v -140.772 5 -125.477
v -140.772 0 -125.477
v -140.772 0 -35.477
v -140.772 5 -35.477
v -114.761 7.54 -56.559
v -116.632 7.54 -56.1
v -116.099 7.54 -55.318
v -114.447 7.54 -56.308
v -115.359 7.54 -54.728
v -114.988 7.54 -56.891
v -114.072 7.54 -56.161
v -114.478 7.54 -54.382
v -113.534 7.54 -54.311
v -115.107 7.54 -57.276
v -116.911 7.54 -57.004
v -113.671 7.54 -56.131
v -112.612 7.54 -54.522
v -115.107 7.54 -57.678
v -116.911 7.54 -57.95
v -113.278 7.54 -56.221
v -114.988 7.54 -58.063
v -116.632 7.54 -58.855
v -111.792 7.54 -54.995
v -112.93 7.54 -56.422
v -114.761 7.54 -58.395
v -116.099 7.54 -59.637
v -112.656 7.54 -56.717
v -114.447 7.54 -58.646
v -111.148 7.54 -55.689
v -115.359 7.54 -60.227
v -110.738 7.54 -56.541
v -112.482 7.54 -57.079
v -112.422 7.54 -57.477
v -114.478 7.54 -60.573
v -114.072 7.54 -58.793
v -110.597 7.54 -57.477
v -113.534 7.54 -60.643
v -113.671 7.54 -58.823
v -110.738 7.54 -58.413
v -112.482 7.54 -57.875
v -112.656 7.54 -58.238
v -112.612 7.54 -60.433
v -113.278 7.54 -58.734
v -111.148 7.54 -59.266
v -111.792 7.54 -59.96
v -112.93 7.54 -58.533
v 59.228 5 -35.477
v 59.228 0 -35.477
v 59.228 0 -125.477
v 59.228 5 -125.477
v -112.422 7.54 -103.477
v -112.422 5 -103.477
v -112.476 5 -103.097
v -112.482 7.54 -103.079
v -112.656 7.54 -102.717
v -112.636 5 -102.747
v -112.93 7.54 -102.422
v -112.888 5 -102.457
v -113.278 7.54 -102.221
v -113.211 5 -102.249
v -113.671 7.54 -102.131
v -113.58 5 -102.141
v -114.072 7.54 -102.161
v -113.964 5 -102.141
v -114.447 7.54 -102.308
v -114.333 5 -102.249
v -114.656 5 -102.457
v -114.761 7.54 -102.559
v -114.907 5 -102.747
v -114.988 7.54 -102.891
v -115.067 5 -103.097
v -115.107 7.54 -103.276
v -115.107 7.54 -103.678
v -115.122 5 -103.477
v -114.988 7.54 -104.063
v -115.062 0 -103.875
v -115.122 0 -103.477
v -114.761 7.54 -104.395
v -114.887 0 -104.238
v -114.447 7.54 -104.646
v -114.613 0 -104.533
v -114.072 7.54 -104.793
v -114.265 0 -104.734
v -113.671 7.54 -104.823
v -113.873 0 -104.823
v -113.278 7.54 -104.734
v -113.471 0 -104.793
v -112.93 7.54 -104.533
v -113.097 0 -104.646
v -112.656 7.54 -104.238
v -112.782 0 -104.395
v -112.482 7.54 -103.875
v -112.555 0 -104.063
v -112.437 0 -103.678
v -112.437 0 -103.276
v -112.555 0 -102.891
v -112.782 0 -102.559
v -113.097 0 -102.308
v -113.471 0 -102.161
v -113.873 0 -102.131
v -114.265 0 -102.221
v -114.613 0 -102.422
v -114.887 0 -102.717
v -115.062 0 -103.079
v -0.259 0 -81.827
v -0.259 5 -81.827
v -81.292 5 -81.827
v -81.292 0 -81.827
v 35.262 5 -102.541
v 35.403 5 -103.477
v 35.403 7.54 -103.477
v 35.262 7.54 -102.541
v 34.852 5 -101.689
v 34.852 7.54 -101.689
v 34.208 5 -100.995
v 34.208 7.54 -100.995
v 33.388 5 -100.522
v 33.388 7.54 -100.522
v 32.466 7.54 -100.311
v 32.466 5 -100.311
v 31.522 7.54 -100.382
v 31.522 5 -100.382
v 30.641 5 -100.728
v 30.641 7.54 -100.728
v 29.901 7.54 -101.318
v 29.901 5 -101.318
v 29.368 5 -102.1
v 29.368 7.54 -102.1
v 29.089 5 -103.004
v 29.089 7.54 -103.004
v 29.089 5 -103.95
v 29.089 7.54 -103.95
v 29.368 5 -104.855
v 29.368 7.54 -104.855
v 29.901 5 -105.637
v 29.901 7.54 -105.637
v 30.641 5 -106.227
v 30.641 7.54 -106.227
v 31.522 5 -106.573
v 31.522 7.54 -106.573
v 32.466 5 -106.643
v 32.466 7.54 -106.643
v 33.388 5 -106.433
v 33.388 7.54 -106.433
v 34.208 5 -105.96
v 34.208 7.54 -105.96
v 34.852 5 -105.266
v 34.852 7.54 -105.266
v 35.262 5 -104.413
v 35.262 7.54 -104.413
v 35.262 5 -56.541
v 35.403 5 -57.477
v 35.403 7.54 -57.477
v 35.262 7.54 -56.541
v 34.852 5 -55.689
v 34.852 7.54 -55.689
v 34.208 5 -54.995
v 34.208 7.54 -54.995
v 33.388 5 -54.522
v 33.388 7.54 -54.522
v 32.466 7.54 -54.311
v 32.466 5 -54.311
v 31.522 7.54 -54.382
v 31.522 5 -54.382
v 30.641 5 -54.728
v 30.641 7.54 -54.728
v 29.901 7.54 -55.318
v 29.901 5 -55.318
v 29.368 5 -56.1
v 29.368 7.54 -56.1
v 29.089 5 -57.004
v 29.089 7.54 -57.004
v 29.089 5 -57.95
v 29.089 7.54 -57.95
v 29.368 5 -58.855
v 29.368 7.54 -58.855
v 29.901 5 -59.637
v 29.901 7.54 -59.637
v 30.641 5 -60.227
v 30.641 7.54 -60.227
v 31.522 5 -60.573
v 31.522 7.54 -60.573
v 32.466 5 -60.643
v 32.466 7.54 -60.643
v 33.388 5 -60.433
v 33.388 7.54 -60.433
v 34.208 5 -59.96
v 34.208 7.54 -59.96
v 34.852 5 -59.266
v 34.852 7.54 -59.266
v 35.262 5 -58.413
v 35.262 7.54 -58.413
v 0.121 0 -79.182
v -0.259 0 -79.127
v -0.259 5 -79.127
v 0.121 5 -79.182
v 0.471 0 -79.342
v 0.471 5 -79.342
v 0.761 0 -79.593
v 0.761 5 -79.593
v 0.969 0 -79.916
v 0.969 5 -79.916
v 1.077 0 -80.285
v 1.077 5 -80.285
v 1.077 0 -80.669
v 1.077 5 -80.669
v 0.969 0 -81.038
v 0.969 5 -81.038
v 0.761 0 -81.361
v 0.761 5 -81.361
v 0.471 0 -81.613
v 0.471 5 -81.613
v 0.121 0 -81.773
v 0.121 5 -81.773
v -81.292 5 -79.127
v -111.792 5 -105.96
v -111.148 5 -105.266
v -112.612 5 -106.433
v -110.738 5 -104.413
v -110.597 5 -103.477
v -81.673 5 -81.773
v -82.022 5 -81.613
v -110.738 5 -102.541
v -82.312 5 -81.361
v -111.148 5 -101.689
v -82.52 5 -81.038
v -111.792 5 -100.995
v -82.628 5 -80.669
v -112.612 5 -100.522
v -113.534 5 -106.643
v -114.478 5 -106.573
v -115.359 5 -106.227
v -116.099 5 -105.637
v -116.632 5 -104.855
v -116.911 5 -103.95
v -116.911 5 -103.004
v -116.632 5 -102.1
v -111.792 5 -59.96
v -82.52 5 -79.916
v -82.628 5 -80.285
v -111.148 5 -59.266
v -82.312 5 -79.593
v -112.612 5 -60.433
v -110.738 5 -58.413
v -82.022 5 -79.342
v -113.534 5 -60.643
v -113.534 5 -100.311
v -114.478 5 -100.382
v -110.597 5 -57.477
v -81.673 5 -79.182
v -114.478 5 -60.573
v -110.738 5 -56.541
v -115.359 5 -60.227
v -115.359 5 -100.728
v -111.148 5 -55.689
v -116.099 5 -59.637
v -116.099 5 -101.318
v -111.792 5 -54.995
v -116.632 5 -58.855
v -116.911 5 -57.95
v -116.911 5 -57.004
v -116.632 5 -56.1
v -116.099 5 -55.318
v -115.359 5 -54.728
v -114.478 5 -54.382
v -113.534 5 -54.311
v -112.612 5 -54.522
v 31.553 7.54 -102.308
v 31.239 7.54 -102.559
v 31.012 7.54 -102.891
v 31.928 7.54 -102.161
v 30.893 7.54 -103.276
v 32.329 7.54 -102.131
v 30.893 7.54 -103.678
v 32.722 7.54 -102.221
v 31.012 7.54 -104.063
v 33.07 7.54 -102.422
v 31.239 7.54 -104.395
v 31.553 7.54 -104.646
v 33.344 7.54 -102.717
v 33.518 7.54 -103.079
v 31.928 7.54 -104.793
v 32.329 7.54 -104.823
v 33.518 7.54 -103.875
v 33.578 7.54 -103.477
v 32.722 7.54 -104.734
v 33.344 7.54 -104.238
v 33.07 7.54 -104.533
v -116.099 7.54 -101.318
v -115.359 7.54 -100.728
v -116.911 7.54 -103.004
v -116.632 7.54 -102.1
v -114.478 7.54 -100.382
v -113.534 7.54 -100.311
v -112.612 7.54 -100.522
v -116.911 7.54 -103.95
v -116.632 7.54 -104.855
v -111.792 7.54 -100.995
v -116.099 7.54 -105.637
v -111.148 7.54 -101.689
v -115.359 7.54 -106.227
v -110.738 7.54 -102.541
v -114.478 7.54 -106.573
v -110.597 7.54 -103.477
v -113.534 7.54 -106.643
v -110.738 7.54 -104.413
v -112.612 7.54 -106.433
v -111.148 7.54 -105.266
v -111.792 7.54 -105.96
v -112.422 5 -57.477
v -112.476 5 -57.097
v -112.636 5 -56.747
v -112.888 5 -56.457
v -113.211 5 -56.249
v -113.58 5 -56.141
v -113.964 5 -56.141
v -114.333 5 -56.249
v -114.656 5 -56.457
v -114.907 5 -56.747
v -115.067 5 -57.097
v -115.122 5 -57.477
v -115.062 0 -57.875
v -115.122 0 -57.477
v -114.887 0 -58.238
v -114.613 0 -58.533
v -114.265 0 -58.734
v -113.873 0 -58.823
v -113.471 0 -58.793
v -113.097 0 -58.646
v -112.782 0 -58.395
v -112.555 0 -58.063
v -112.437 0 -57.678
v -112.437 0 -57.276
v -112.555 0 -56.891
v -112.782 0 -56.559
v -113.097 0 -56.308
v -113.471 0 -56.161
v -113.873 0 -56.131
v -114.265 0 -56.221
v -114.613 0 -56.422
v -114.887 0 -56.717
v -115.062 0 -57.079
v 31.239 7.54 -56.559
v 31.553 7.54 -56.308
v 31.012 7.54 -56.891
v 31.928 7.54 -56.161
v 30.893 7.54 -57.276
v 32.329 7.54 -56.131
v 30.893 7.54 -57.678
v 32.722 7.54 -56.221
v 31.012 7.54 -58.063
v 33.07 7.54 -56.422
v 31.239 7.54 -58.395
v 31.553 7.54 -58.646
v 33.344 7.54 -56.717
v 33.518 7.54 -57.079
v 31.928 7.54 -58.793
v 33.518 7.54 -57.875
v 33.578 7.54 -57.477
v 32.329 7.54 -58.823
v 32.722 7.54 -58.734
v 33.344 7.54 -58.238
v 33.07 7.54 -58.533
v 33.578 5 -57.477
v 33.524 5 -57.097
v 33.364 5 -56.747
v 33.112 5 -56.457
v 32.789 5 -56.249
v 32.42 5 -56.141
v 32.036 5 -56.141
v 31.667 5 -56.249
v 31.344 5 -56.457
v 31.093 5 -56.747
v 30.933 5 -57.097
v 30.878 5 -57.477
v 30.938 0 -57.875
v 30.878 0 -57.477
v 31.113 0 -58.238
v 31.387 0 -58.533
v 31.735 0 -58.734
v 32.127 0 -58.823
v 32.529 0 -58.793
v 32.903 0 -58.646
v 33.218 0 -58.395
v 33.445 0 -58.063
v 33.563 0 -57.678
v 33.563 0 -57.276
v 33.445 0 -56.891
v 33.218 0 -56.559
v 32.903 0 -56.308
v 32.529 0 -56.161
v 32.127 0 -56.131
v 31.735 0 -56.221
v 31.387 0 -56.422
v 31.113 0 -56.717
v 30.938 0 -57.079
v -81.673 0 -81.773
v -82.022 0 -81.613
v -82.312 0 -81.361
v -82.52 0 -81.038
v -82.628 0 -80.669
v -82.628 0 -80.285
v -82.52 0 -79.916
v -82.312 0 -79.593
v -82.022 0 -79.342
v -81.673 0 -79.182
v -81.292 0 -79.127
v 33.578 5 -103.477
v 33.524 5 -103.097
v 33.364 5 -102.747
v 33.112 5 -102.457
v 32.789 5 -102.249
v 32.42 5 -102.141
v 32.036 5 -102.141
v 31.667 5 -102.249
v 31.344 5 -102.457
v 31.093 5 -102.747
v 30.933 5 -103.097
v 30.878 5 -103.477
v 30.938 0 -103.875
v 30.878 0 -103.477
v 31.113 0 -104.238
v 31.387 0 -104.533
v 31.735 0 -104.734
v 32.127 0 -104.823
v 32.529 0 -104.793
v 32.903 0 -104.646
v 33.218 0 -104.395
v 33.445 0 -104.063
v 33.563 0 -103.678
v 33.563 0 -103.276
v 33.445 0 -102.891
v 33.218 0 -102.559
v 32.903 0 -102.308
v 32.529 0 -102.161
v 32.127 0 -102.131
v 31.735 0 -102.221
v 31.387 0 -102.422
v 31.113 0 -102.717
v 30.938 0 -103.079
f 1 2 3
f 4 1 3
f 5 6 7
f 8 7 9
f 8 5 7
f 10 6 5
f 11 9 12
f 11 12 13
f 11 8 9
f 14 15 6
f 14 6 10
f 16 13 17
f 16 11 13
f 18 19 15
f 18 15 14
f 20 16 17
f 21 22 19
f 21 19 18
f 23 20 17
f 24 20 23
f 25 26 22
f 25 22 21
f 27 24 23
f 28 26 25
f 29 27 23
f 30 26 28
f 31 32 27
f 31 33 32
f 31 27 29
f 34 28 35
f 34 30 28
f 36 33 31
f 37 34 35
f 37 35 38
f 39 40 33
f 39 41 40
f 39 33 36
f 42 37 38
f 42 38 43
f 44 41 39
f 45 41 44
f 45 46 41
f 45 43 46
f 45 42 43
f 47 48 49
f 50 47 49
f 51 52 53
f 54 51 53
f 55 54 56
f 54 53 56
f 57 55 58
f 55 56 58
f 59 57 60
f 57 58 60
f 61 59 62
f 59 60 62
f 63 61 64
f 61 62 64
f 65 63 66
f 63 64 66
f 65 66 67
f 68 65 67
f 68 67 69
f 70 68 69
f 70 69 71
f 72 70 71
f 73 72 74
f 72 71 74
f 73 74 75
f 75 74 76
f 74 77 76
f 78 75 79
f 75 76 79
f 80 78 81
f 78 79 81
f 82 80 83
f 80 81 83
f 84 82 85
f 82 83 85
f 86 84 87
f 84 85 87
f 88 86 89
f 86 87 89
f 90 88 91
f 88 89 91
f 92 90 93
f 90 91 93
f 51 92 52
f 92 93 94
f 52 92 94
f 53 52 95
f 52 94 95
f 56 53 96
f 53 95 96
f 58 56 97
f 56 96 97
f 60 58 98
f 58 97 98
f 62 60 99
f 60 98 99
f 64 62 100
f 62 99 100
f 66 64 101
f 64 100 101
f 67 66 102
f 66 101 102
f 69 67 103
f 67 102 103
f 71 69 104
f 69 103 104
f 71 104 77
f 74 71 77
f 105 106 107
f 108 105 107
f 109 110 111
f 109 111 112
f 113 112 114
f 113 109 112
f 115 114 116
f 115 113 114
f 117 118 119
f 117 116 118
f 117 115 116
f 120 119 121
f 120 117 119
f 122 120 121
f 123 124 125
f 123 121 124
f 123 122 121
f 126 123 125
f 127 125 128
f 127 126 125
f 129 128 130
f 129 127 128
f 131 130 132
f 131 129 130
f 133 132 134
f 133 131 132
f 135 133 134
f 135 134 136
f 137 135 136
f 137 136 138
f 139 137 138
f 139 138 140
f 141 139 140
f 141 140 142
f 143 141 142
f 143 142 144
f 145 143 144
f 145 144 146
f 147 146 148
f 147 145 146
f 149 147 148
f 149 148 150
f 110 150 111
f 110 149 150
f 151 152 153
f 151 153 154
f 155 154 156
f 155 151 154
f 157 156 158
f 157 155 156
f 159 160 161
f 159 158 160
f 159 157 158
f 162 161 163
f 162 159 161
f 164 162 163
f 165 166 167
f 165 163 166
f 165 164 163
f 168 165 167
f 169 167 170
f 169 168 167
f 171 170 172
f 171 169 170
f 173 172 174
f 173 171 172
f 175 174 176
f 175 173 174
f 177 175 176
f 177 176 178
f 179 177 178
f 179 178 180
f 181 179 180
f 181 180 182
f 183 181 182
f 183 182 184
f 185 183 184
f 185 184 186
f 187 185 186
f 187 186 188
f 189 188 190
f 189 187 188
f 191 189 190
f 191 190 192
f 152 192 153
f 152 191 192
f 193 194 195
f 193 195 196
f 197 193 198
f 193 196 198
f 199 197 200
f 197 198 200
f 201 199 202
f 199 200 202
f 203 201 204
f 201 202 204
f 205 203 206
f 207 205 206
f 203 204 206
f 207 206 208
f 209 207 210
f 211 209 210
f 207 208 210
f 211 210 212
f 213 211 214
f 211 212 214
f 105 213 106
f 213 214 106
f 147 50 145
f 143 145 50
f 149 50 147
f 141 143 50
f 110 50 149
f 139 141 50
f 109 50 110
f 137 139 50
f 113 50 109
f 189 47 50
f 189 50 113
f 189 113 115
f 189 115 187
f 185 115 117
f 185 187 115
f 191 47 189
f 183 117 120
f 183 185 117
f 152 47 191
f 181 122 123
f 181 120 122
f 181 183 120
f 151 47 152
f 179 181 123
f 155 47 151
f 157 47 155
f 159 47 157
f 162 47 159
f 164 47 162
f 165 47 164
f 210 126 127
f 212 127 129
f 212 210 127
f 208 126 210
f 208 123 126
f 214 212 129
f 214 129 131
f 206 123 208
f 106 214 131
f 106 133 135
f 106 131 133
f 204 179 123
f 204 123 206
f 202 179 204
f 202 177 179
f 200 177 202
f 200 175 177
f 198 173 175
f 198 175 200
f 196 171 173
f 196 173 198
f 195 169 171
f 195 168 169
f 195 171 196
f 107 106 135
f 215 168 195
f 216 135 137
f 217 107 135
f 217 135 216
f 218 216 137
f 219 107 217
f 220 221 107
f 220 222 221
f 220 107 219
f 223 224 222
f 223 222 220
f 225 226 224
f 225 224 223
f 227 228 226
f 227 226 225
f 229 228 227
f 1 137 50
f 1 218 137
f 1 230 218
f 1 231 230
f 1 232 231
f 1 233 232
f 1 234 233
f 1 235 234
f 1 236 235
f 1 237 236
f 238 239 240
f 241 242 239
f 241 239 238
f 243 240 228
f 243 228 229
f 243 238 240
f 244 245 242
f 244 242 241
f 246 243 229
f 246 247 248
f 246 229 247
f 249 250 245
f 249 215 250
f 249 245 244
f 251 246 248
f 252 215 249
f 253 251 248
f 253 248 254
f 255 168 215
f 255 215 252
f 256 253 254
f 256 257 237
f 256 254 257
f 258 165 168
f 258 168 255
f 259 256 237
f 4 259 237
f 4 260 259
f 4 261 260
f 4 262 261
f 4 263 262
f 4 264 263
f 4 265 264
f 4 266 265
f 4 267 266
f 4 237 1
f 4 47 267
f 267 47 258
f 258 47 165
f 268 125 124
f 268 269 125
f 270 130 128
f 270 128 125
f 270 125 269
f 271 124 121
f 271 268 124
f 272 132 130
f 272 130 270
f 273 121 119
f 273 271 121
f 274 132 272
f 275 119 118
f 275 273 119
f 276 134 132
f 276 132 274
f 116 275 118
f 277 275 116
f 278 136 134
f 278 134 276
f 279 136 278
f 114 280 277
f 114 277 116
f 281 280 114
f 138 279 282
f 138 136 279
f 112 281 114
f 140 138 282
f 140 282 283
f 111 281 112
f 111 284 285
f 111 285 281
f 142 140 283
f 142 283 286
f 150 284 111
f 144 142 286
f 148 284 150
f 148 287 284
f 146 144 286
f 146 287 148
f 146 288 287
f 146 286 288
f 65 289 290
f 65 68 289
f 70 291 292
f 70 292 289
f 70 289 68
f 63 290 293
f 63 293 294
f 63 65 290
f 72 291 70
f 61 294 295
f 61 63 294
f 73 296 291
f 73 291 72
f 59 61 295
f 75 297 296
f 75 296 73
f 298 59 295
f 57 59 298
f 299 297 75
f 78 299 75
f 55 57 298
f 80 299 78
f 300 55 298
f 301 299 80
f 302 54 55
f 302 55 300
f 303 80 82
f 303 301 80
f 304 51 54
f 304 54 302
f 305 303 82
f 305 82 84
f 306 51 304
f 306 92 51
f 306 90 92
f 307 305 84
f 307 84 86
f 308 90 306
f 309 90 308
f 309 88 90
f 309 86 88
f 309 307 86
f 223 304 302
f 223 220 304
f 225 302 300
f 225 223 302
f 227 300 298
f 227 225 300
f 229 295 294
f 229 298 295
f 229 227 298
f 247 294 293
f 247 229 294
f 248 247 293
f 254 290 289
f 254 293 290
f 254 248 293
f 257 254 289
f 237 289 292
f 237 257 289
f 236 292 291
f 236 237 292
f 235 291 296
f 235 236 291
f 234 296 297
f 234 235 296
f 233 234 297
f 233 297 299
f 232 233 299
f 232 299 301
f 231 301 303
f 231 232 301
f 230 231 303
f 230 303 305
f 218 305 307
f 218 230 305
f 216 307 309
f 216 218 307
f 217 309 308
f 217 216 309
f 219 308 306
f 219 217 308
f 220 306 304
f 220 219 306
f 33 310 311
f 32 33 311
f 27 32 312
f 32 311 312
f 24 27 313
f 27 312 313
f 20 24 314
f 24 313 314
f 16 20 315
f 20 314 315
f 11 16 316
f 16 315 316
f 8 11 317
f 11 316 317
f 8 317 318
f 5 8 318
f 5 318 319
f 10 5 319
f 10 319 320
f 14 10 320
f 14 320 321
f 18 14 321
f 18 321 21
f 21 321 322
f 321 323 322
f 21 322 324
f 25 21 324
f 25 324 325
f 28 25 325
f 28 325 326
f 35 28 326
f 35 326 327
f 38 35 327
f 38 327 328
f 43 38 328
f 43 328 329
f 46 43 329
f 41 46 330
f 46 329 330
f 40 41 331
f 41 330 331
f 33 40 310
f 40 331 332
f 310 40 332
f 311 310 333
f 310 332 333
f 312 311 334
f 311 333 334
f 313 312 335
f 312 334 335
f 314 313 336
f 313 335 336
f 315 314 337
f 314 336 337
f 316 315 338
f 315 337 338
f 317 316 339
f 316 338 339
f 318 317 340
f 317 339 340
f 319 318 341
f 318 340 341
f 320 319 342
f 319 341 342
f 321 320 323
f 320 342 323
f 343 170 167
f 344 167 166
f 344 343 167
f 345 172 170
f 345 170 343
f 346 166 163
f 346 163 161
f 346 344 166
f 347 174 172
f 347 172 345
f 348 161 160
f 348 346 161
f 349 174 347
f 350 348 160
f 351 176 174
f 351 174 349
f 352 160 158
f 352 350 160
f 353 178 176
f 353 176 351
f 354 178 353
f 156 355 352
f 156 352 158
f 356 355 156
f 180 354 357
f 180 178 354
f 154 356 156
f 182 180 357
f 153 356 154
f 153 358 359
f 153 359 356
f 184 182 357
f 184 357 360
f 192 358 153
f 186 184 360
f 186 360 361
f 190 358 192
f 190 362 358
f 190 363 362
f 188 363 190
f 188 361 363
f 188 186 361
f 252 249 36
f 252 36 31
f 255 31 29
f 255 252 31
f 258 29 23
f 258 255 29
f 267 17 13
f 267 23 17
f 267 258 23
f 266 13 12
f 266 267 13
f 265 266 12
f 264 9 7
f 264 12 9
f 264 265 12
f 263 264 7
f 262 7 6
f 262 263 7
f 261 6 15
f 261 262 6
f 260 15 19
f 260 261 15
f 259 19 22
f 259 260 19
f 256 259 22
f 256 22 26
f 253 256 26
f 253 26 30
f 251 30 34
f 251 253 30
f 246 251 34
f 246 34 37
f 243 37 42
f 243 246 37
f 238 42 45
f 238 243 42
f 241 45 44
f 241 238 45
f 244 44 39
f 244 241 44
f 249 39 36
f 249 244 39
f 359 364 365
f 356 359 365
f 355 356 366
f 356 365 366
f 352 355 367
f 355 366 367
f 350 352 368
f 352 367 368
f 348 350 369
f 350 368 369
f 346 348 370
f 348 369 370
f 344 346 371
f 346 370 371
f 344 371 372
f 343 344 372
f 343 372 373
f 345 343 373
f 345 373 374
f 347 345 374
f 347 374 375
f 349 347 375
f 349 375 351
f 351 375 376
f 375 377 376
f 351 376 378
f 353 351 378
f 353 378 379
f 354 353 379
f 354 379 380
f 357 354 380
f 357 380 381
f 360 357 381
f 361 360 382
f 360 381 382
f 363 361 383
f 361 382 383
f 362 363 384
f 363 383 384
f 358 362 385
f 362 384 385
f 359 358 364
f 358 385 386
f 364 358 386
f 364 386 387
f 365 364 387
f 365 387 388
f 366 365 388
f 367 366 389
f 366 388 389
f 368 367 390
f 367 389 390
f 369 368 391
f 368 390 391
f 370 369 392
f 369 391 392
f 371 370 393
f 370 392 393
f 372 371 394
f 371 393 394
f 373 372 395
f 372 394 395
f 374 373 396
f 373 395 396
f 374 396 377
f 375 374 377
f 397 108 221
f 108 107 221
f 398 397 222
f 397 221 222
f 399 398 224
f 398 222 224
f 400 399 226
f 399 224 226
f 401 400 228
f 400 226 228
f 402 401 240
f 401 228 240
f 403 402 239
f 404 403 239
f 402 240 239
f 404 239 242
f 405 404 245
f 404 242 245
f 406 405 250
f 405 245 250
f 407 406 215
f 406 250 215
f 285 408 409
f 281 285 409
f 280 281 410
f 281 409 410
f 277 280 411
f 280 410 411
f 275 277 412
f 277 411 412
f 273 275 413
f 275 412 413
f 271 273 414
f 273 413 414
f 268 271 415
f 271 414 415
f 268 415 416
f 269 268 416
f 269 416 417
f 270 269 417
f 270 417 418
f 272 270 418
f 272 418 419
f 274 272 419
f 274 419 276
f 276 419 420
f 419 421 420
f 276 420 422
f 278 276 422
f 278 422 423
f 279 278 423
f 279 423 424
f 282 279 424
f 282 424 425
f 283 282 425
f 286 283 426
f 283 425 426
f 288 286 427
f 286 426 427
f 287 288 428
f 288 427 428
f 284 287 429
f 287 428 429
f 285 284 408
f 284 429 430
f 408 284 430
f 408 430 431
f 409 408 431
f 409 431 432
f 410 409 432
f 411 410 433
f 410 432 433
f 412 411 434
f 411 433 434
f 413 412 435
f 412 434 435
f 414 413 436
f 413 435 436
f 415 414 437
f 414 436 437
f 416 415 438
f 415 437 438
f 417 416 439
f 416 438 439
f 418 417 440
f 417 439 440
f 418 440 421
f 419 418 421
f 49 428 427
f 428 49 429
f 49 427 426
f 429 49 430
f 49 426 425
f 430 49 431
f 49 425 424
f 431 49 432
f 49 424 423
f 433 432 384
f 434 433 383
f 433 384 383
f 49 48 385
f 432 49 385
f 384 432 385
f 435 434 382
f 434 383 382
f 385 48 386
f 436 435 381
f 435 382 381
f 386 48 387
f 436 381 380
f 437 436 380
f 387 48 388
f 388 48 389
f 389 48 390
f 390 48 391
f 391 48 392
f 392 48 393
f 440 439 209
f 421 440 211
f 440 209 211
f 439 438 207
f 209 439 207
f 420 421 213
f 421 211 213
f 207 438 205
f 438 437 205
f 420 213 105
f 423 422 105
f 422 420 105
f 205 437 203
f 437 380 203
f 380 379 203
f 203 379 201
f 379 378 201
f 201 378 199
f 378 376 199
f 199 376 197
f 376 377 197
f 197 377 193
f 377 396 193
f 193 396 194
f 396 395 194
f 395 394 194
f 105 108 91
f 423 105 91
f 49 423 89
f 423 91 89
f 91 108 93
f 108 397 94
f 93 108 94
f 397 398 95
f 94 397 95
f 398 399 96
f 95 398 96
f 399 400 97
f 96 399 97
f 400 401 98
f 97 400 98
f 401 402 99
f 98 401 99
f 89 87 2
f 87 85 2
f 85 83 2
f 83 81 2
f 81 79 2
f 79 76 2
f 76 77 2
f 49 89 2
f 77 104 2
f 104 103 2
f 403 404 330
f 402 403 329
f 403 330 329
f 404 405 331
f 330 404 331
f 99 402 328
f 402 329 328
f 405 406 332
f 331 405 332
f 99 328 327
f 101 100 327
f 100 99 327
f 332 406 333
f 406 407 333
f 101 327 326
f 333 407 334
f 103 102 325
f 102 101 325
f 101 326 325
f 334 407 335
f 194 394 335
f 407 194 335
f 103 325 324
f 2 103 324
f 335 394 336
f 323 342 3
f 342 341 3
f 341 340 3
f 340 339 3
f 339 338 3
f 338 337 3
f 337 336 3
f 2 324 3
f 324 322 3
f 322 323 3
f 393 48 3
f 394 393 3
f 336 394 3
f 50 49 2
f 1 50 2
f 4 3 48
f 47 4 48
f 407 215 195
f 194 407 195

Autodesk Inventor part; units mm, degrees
ref_plane "YZ Plane" through (0, 0, 0) normal (1, 0, 0) x (0, 1, 0)
ref_plane "XZ Plane" through (0, 0, 0) normal (0, 1, 0) x (-1, 0, 0)
ref_plane "XY Plane" through (0, 0, 0) normal (0, 0, 1) x (1, 0, 0)
sketch "Sketch1" plane through (0, 0, 0) normal (0, 1, 0) x (-1, 0, 0)
  circle A0 centre (113.7717, -57.4772) radius 1.35
  circle A1 centre (113.7717, -103.4772) radius 1.35
  circle A2 centre (-32.2283, -57.4772) radius 1.35
  circle A3 centre (-32.2283, -103.4772) radius 1.35
  line L0 (140.7717, -35.4772) -> (-59.2283, -35.4772)
  line L1 (-59.2283, -35.4772) -> (-59.2283, -125.4772)
  line L2 (-59.2283, -125.4772) -> (140.7717, -125.4772)
  line L3 (140.7717, -125.4772) -> (140.7717, -35.4772)
  point P0 (0, 0)
  point P1 (140.7717, -80.4772)
  dimension "d2" = 2.7
  dimension "d3" = 2.7
  dimension "d4" = 2.7
  dimension "d5" = 2.7
  dimension "d6" = 200
  dimension "d7" = 90
extrude "Extrusion1" add sketch "Sketch1" along normal blind 5
sketch "Sketch2" plane through (0, 5, 0) normal (0, 1, 0) x (1, 0, 0)
  circle A0 centre (-72.5219, 80.4772) radius 1.35
  circle A1 centre (-9.0219, 80.4772) radius 1.35
  circle A2 centre (-40.7719, 80.4772) radius 1.35
  line L0 (-140.7717, 125.4772) -> (-140.7717, 35.4772) projected
  point P0 (0, 0)
  point P1 (-140.7717, 80.4772)
  dimension "d12" = 2.7
  dimension "d13" = 2.7
  dimension "d14" = 63.5
  dimension "d15" = 2.7
  dimension "d16" = 31.75
  dimension "d22" = 68.2498
extrude "Extrusion2" cut sketch "Sketch2" against normal blind 11.35
sketch "Sketch3" plane through (0, 5, 0) normal (0, 1, 0) x (1, 0, 0)
  circle A0 centre (-113.7717, 57.4772) radius 1.35 projected
  circle A1 centre (-113.7717, 57.4772) radius 3.175
  circle A2 centre (-113.7717, 57.4772) radius 1.35
  circle A3 centre (-113.7717, 103.4772) radius 1.35 projected
  circle A4 centre (-113.7717, 103.4772) radius 1.35
  circle A5 centre (-113.7717, 103.4772) radius 3.175
  circle A6 centre (32.2283, 103.4772) radius 1.35 projected
  circle A7 centre (32.2283, 103.4772) radius 1.35
  circle A8 centre (32.2283, 103.4772) radius 3.175
  circle A9 centre (32.2283, 57.4772) radius 1.35 projected
  circle A10 centre (32.2283, 57.4772) radius 1.35
  circle A11 centre (32.2283, 57.4772) radius 3.175
  point P0 (0, 0)
  dimension "d25" = 6.35
  dimension "d26" = 6.35
  dimension "d27" = 6.35
  dimension "d28" = 6.35
extrude "Extrusion3" add sketch "Sketch3" along normal blind 2.54 contours A0 | A1 | A3 | A5 | A6 | A8 | A9 | A11
sketch "Sketch4" plane through (-113.7717, 7.54, -57.4772) normal (0, 1, 0) x (1, 0, 0)
  circle A0 centre (0, 0) radius 1.35 projected
  circle A1 centre (0, 0) radius 1.35
  circle A2 centre (0, 46) radius 1.35 projected
  circle A3 centre (0, 46) radius 1.35
  circle A4 centre (146, 46) radius 1.35 projected
  circle A5 centre (146, 46) radius 1.35
  circle A6 centre (146, 0) radius 3.175 projected
  circle A7 centre (146, 0) radius 1.35
  point P0 (113.7717, -57.4772)
  dimension "d31" = 2.7
  dimension "d32" = 2.7
  dimension "d33" = 2.7
  dimension "d34" = 2.7
extrude "Extrusion4" cut sketch "Sketch4" against normal blind 21.59 contours A0 | A2 | A4 | A7
sketch "Sketch5" plane through (0, 5, 0) normal (0, 1, 0) x (1, 0, 0)
  circle A0 centre (-72.5219, 80.4772) radius 1.35 projected
  circle A1 centre (-9.0219, 80.4772) radius 1.35 projected
  line L0 (-72.5219, 79.1272) -> (-9.0219, 79.1272)
  line L1 (-9.0219, 79.1272) -> (-9.0219, 81.8272)
  line L2 (-9.0219, 81.8272) -> (-72.5219, 81.8272)
  line L3 (-72.5219, 81.8272) -> (-72.5219, 79.1272)
  line L4 (-72.5219, 81.8272) -> (-81.2922, 81.8272)
  line L5 (-81.2922, 81.8272) -> (-81.2922, 79.1272)
  line L6 (-81.2922, 79.1272) -> (-72.5219, 79.1272)
  line L7 (-72.5219, 79.1272) -> (-72.5219, 81.8272)
  line L8 (-9.0219, 81.8272) -> (-0.2589, 81.8272)
  line L9 (-0.2589, 81.8272) -> (-0.2589, 79.1272)
  line L10 (-0.2589, 79.1272) -> (-9.0219, 79.1272)
  line L11 (-9.0219, 79.1272) -> (-9.0219, 81.8272)
  circle A2 centre (-81.2922, 80.4772) radius 1.35
  circle A3 centre (-0.2589, 80.4772) radius 1.35
  point P0 (0, 0)
  dimension "d37" = 8.763
  dimension "d38" = 8.7702
extrude "Extrusion5" cut sketch "Sketch5" against normal up to surface (5 mm away) contours A0 L3 | A0 L2 A1 L0 | L3 A0 | A0 L6 A2 L4 | L8 A3 L10 A1 | A2 L5 | L5 A2 | A3 L9 | L9 A3
properties part number "battery holder v2 mount"
